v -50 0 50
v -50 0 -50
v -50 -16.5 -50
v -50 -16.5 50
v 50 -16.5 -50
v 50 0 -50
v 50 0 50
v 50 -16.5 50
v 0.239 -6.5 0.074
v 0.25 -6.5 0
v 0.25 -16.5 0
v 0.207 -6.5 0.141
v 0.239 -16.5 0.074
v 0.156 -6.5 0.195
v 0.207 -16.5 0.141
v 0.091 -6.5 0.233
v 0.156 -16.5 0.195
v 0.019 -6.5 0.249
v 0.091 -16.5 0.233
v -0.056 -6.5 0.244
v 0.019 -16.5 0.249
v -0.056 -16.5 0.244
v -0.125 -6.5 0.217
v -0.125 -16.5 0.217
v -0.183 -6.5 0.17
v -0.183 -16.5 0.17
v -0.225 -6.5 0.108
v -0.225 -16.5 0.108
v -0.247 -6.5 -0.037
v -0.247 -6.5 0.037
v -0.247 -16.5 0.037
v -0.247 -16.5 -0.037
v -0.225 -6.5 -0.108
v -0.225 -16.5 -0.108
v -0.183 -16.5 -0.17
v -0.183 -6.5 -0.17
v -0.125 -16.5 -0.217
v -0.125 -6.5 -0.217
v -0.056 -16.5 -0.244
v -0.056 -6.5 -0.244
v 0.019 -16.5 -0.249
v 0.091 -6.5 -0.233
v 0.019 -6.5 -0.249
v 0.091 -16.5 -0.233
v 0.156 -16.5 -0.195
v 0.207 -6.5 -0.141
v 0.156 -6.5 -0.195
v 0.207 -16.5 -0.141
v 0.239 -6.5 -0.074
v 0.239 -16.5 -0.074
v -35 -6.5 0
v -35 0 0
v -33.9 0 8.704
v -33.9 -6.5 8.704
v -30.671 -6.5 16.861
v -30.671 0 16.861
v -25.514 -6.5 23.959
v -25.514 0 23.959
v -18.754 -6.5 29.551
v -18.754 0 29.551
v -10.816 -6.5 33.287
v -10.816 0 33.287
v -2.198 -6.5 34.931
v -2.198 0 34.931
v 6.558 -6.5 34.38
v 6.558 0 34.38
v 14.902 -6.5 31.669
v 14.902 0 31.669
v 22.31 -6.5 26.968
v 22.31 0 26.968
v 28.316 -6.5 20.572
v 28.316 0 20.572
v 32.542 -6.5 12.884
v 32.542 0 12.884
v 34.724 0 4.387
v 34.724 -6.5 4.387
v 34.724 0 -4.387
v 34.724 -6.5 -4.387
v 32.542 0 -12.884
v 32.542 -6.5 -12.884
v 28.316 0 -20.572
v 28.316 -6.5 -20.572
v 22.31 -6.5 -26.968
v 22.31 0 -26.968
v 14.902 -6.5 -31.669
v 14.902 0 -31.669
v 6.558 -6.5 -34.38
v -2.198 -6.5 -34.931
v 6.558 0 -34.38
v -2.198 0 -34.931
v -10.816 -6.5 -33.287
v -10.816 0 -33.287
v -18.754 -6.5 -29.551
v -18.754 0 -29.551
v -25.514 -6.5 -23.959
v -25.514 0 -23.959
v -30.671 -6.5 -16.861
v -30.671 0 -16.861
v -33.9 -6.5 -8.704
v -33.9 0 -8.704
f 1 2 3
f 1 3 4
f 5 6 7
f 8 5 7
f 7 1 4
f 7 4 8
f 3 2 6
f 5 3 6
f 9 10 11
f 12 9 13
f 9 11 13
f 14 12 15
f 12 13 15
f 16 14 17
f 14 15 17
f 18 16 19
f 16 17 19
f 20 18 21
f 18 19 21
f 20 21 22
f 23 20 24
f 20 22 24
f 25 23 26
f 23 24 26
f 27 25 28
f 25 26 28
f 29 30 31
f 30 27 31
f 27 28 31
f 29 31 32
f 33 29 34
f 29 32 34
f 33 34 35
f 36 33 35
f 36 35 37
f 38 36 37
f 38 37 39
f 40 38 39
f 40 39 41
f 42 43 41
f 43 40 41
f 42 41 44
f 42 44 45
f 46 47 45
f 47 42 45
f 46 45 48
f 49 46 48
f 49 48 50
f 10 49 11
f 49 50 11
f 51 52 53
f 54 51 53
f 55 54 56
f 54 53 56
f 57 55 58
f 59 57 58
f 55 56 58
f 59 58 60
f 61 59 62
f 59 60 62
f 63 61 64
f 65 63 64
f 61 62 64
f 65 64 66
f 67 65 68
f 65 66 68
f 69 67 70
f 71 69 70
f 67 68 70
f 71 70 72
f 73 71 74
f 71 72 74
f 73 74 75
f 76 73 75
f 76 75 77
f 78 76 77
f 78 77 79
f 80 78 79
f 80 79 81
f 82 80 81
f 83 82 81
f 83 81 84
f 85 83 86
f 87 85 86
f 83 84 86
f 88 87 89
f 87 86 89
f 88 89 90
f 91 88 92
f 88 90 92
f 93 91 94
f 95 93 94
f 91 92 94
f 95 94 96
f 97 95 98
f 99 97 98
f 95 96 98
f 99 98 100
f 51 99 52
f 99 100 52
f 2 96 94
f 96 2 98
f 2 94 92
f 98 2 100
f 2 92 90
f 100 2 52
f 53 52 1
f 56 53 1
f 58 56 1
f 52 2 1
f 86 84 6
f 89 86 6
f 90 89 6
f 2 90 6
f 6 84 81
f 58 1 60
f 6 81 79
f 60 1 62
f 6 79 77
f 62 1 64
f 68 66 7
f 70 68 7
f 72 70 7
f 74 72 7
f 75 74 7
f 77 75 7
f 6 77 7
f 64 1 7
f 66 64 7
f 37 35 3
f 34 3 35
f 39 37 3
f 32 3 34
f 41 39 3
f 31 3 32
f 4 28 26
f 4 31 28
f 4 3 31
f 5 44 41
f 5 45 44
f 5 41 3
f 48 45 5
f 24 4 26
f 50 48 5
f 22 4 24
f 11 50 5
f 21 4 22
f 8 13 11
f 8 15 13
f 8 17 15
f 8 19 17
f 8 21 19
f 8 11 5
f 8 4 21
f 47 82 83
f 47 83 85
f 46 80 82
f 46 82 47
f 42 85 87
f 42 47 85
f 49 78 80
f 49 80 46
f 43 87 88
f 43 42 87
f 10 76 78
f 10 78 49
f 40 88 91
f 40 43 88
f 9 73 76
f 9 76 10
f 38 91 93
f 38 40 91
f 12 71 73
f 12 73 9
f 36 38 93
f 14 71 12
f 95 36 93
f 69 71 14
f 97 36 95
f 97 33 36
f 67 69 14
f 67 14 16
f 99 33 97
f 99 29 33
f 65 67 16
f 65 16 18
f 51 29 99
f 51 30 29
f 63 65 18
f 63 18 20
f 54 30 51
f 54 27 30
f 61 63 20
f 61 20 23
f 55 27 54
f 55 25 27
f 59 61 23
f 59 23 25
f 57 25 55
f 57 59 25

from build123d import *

# Parameters (mm, degrees)
F0_W     = 100
F0_H     = 100
F1_DEPTH = 16.5
F2_R     = 0.25
F3_DEPTH = 16.501
F4_R     = 35
F4_R_2   = 0.25
F5_DEPTH = 6.5


with BuildPart() as f1:
    # F0 (on Front) → F1 (new body)
    with BuildSketch(Plane.XZ):
        Rectangle(F0_W, F0_H)
    extrude(amount=F1_DEPTH)

    # F2 (on face) → F3 (cut, through all)
    with BuildSketch(Plane.XZ.offset(16.5)):
        Circle(F2_R)
    extrude(amount=-F3_DEPTH, mode=Mode.SUBTRACT)

    # F4 (on face) → F5 (cut)
    with BuildSketch(Plane(origin=(0, 0, 0), x_dir=(-1, 0, 0), z_dir=(0, 1, 0))):
        Circle(F4_R)
        Circle(F4_R_2, mode=Mode.SUBTRACT)
    extrude(amount=-F5_DEPTH, mode=Mode.SUBTRACT)


solid = f1.part
